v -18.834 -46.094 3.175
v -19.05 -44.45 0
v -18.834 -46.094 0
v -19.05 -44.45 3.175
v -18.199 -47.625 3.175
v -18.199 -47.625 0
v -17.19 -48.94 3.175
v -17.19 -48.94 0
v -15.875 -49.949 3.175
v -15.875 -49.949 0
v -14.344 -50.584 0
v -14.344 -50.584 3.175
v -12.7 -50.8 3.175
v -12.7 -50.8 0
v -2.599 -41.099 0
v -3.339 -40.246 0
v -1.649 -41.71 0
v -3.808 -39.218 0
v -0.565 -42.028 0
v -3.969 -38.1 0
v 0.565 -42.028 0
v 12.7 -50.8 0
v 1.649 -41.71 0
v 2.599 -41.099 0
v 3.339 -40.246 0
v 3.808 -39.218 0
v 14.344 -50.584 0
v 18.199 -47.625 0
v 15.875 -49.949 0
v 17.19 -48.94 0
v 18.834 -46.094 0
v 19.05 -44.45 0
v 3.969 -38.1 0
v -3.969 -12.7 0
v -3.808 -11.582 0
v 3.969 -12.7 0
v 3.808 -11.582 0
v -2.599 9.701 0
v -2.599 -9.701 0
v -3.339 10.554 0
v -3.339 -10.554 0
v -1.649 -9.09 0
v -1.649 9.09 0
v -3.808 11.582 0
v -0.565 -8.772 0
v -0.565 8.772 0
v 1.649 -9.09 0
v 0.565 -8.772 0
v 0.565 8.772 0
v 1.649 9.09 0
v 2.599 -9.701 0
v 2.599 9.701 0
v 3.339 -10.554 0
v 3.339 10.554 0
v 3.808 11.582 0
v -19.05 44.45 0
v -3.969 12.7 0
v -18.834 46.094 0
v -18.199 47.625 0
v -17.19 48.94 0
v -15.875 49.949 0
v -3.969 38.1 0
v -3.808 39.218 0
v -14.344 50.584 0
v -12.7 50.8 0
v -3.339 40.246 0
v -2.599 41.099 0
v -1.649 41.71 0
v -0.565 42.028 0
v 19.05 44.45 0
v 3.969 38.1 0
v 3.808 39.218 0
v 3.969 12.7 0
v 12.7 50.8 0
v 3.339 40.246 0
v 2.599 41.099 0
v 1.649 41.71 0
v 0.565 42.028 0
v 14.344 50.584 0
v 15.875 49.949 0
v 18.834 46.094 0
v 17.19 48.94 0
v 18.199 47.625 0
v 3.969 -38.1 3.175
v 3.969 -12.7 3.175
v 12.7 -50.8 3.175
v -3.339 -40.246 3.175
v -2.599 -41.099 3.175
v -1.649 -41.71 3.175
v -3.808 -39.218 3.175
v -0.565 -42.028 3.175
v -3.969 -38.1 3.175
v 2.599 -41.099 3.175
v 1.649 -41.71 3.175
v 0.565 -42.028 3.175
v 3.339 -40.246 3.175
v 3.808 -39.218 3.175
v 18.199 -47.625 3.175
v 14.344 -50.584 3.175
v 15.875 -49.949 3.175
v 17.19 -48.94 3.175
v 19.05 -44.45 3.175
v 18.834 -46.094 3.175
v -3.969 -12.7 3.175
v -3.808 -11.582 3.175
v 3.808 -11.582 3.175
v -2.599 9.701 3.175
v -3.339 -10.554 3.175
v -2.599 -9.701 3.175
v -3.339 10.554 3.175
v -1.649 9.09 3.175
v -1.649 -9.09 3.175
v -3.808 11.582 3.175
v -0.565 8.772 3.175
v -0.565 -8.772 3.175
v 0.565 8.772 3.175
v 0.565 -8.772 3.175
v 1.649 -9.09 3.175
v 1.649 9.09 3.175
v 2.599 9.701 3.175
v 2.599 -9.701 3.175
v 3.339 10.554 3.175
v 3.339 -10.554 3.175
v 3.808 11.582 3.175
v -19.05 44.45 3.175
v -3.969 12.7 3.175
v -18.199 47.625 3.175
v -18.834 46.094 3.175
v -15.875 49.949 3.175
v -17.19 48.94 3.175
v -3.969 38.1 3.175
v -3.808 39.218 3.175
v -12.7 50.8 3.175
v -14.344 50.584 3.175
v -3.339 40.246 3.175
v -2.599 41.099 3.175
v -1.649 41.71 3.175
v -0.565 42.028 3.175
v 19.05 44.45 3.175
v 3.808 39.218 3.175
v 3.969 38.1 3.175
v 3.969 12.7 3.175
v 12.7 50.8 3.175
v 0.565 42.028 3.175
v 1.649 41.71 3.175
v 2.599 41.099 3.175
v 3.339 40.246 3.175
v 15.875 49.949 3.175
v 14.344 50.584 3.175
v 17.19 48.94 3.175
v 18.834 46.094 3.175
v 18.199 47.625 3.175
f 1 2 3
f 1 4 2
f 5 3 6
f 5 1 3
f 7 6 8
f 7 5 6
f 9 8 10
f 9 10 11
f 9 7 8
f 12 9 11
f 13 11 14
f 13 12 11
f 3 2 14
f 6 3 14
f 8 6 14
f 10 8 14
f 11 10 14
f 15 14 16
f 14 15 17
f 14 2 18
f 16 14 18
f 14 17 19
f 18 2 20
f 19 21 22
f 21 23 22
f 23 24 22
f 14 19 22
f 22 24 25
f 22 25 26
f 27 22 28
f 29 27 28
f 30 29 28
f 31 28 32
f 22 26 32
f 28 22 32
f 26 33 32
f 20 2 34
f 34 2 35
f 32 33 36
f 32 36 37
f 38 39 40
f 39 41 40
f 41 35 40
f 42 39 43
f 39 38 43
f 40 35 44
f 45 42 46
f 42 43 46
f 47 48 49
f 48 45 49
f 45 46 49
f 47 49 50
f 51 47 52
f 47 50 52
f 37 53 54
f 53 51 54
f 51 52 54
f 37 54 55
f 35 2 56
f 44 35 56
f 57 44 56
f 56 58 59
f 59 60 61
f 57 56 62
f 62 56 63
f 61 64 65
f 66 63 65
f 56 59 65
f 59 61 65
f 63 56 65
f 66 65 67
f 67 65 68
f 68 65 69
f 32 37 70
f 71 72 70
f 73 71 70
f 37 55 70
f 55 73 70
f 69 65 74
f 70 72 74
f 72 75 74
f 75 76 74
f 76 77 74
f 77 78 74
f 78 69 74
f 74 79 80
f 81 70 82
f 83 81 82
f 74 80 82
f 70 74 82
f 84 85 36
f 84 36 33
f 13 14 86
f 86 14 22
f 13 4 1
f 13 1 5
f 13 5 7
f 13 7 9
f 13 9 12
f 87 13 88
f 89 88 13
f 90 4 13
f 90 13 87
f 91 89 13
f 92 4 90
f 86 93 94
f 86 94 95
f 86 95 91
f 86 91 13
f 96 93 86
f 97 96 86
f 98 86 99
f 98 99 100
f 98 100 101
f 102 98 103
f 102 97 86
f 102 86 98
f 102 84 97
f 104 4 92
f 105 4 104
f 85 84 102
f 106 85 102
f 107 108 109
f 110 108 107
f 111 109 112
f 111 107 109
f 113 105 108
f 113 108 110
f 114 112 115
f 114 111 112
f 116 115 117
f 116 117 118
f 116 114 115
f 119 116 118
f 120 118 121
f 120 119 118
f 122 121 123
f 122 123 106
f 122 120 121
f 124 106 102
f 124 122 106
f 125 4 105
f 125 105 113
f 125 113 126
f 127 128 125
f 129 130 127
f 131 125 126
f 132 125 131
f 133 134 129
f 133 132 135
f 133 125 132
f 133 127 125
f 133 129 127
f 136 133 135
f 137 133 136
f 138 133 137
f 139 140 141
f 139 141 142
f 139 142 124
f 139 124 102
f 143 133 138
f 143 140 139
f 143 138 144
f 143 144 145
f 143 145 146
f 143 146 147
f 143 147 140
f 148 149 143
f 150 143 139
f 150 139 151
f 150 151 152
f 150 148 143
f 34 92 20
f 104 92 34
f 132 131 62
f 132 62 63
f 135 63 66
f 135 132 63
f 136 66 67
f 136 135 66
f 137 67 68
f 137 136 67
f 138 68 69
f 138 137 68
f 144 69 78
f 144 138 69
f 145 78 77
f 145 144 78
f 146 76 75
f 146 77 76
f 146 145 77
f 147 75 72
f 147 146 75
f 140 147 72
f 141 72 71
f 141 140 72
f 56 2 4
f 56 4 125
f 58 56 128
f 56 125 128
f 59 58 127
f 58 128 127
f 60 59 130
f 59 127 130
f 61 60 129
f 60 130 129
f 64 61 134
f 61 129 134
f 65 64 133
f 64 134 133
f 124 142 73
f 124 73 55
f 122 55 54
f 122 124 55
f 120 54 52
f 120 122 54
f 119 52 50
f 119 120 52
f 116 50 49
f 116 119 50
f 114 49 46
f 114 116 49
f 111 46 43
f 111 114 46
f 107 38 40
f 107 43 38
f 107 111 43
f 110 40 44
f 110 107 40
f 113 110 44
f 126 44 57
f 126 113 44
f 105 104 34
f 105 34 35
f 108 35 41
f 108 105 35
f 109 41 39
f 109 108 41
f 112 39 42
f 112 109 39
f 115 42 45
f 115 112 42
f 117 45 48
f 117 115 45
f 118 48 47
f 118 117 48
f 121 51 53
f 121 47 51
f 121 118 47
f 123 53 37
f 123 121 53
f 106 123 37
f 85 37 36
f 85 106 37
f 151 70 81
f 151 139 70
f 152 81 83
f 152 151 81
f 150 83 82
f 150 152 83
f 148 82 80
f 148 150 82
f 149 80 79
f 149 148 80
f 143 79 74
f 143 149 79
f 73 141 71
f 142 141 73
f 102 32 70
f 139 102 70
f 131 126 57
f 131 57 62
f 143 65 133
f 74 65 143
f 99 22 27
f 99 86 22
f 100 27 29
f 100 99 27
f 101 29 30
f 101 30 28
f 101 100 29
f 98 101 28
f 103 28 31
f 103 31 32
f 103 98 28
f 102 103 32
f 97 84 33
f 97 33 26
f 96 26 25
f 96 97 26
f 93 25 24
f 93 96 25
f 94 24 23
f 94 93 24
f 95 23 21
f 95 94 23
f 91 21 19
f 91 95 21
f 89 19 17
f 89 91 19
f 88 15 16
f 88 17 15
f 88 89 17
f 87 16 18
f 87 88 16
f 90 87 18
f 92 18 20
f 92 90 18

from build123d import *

# Parameters (mm, degrees)
SKETCH1_W           = 38.1
SKETCH1_H           = 101.6
BOSS_EXTRUDE1_DEPTH = 3.175
FILLET1_R           = 6.35
CUT_EXTRUDE1_DEPTH  = 55.34724579


with BuildPart() as part:
    # Sketch1 → Boss-Extrude1 (new body)
    with BuildSketch(Plane.XY):
        Rectangle(SKETCH1_W, SKETCH1_H)
    extrude(amount=BOSS_EXTRUDE1_DEPTH)

    # Fillet1
    fillet1_edges = [part.edges().sort_by_distance(p)[0] for p in [
        (19.05, -50.8, 1.5875),
        (-19.05, -50.8, 1.5875),
        (-19.05, 50.8, 1.5875),
        (19.05, 50.8, 1.5875),
    ]]
    fillet(fillet1_edges, radius=FILLET1_R)

    # Sketch2 → Cut-Extrude1 (cut, through all)
    with BuildSketch(Plane.XY.offset(3.175)):
        with BuildLine():
            Line((3.96875, 38.1), (3.96875, 12.7))
            ThreePointArc((3.96875, 12.7), (0, 8.73125), (-3.96875, 12.7))
            Line((-3.96875, 12.7), (-3.96875, 38.1))
            ThreePointArc((-3.96875, 38.1), (0, 42.06875), (3.96875, 38.1))
        make_face()
        with BuildLine():
            Line((3.96875, -12.7), (3.96875, -38.1))
            ThreePointArc((3.96875, -38.1), (0, -42.06875), (-3.96875, -38.1))
            Line((-3.96875, -38.1), (-3.96875, -12.7))
            ThreePointArc((-3.96875, -12.7), (0, -8.73125), (3.96875, -12.7))
        make_face()
    extrude(amount=-CUT_EXTRUDE1_DEPTH, mode=Mode.SUBTRACT)


solid = part.part
